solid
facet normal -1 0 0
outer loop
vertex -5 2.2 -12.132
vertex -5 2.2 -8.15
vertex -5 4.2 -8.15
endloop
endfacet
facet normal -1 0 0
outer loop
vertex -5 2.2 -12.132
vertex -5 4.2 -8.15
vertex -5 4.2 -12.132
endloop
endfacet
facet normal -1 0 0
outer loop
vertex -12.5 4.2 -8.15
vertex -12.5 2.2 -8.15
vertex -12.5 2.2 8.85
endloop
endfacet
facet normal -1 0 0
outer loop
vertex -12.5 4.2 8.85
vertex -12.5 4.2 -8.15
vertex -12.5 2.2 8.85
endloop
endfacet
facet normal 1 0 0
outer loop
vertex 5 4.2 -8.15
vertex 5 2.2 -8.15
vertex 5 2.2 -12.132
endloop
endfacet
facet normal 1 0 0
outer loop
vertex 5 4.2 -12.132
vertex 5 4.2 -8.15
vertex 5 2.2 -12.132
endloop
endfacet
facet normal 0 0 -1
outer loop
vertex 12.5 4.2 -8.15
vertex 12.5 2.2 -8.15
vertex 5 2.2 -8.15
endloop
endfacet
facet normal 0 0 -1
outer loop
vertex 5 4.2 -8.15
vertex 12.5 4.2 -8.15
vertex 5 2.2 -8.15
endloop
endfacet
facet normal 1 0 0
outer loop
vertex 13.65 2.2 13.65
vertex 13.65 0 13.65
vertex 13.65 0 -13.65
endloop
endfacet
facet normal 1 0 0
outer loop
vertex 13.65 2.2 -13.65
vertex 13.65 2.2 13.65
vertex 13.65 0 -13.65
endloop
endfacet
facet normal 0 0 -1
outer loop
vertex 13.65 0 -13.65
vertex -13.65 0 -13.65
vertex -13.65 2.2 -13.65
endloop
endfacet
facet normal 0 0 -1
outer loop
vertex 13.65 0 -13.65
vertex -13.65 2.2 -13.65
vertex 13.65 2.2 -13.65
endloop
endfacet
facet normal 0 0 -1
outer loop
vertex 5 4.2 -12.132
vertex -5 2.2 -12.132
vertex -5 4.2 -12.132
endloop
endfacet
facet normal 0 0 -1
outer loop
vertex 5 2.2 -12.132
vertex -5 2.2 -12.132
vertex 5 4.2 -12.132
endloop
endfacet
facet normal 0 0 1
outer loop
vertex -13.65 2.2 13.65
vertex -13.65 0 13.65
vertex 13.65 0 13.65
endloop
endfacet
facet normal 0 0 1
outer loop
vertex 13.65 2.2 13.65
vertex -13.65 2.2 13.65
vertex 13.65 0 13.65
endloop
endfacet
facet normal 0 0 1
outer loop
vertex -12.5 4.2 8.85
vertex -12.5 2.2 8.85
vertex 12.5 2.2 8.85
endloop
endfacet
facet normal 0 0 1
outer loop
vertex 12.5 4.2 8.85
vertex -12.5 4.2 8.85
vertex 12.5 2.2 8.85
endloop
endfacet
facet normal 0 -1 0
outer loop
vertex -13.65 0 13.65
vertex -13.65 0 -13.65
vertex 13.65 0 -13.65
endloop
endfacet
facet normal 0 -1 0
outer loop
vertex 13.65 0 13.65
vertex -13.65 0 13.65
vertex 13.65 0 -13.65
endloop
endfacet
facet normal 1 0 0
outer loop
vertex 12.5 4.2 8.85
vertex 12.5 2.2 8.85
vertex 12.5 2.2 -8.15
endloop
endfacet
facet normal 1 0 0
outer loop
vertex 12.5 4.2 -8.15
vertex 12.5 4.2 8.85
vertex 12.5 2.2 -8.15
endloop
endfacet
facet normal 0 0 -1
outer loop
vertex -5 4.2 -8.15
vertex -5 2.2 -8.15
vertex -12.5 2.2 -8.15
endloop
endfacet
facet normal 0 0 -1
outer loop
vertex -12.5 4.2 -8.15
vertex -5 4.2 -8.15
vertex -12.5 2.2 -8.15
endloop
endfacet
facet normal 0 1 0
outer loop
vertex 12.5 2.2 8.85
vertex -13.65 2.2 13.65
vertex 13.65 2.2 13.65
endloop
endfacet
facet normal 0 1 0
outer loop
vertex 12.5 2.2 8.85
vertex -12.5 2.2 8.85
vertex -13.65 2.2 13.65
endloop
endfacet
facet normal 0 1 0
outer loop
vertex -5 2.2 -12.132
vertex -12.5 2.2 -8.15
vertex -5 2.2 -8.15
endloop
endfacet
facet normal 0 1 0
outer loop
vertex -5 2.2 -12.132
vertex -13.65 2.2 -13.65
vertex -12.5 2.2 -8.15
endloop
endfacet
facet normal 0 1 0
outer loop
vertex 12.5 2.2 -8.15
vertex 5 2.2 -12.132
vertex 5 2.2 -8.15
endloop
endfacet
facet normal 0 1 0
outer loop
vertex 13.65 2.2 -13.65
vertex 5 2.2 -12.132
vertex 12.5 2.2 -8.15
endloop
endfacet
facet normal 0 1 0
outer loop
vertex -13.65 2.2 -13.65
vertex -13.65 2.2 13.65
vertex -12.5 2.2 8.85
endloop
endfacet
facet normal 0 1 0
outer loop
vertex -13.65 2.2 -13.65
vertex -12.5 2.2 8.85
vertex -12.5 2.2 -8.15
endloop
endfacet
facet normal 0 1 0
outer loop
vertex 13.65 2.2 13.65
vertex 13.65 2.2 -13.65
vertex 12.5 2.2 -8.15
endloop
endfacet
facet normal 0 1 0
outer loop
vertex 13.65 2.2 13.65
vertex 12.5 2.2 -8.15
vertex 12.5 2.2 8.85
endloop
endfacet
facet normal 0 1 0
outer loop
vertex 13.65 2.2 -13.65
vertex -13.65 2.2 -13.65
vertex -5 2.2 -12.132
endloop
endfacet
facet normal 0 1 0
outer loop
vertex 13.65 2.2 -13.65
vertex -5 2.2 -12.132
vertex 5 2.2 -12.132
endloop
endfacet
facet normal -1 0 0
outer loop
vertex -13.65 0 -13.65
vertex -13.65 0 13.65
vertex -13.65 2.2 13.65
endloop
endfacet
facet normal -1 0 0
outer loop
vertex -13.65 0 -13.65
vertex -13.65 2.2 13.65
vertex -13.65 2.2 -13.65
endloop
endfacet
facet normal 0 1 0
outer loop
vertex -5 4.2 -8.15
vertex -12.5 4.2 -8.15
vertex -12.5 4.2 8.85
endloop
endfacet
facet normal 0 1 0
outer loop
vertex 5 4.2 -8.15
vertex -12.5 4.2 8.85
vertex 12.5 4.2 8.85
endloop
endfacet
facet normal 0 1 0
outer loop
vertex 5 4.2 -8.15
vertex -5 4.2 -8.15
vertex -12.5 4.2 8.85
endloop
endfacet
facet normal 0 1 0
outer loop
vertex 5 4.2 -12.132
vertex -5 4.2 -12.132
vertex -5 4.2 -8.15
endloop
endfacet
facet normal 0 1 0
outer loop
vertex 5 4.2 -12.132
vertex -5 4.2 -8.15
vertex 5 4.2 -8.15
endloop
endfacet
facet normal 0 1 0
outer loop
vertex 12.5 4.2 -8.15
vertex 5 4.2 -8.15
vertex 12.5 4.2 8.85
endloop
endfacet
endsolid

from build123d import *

# Parameters (mm, degrees)
SKETCH1_W           = 27.3
SKETCH1_H           = 27.3
BOSS_EXTRUDE1_DEPTH = 2.2
SKETCH2_W           = 10
SKETCH2_H           = 3.982118458
BOSS_EXTRUDE3_DEPTH = 2


with BuildPart() as part:
    # Sketch1 → Boss-Extrude1 (new body)
    with BuildSketch(Plane(origin=(0, 0, 0), x_dir=(1, 0, 0), z_dir=(0, 1, 0))):
        Rectangle(SKETCH1_W, SKETCH1_H)
    extrude(amount=BOSS_EXTRUDE1_DEPTH)

    # Sketch2 → Boss-Extrude3 (add)
    with BuildSketch(Plane(origin=(0, 2.2, 0), x_dir=(1, 0, 0), z_dir=(0, 1, 0))):
        with Locations((0, 10.141059229)):
            Rectangle(SKETCH2_W, SKETCH2_H)
        Polygon((-12.5, 8.15), (-12.5, -8.85), (12.5, -8.85), (12.5, 8.15), (5, 8.15), (5, 4.167881542), (-5, 4.167881542), (-5, 8.15), align=None)
        with Locations((0, 6.158940771)):
            Rectangle(SKETCH2_W, SKETCH2_H)
    extrude(amount=BOSS_EXTRUDE3_DEPTH)


solid = part.part
